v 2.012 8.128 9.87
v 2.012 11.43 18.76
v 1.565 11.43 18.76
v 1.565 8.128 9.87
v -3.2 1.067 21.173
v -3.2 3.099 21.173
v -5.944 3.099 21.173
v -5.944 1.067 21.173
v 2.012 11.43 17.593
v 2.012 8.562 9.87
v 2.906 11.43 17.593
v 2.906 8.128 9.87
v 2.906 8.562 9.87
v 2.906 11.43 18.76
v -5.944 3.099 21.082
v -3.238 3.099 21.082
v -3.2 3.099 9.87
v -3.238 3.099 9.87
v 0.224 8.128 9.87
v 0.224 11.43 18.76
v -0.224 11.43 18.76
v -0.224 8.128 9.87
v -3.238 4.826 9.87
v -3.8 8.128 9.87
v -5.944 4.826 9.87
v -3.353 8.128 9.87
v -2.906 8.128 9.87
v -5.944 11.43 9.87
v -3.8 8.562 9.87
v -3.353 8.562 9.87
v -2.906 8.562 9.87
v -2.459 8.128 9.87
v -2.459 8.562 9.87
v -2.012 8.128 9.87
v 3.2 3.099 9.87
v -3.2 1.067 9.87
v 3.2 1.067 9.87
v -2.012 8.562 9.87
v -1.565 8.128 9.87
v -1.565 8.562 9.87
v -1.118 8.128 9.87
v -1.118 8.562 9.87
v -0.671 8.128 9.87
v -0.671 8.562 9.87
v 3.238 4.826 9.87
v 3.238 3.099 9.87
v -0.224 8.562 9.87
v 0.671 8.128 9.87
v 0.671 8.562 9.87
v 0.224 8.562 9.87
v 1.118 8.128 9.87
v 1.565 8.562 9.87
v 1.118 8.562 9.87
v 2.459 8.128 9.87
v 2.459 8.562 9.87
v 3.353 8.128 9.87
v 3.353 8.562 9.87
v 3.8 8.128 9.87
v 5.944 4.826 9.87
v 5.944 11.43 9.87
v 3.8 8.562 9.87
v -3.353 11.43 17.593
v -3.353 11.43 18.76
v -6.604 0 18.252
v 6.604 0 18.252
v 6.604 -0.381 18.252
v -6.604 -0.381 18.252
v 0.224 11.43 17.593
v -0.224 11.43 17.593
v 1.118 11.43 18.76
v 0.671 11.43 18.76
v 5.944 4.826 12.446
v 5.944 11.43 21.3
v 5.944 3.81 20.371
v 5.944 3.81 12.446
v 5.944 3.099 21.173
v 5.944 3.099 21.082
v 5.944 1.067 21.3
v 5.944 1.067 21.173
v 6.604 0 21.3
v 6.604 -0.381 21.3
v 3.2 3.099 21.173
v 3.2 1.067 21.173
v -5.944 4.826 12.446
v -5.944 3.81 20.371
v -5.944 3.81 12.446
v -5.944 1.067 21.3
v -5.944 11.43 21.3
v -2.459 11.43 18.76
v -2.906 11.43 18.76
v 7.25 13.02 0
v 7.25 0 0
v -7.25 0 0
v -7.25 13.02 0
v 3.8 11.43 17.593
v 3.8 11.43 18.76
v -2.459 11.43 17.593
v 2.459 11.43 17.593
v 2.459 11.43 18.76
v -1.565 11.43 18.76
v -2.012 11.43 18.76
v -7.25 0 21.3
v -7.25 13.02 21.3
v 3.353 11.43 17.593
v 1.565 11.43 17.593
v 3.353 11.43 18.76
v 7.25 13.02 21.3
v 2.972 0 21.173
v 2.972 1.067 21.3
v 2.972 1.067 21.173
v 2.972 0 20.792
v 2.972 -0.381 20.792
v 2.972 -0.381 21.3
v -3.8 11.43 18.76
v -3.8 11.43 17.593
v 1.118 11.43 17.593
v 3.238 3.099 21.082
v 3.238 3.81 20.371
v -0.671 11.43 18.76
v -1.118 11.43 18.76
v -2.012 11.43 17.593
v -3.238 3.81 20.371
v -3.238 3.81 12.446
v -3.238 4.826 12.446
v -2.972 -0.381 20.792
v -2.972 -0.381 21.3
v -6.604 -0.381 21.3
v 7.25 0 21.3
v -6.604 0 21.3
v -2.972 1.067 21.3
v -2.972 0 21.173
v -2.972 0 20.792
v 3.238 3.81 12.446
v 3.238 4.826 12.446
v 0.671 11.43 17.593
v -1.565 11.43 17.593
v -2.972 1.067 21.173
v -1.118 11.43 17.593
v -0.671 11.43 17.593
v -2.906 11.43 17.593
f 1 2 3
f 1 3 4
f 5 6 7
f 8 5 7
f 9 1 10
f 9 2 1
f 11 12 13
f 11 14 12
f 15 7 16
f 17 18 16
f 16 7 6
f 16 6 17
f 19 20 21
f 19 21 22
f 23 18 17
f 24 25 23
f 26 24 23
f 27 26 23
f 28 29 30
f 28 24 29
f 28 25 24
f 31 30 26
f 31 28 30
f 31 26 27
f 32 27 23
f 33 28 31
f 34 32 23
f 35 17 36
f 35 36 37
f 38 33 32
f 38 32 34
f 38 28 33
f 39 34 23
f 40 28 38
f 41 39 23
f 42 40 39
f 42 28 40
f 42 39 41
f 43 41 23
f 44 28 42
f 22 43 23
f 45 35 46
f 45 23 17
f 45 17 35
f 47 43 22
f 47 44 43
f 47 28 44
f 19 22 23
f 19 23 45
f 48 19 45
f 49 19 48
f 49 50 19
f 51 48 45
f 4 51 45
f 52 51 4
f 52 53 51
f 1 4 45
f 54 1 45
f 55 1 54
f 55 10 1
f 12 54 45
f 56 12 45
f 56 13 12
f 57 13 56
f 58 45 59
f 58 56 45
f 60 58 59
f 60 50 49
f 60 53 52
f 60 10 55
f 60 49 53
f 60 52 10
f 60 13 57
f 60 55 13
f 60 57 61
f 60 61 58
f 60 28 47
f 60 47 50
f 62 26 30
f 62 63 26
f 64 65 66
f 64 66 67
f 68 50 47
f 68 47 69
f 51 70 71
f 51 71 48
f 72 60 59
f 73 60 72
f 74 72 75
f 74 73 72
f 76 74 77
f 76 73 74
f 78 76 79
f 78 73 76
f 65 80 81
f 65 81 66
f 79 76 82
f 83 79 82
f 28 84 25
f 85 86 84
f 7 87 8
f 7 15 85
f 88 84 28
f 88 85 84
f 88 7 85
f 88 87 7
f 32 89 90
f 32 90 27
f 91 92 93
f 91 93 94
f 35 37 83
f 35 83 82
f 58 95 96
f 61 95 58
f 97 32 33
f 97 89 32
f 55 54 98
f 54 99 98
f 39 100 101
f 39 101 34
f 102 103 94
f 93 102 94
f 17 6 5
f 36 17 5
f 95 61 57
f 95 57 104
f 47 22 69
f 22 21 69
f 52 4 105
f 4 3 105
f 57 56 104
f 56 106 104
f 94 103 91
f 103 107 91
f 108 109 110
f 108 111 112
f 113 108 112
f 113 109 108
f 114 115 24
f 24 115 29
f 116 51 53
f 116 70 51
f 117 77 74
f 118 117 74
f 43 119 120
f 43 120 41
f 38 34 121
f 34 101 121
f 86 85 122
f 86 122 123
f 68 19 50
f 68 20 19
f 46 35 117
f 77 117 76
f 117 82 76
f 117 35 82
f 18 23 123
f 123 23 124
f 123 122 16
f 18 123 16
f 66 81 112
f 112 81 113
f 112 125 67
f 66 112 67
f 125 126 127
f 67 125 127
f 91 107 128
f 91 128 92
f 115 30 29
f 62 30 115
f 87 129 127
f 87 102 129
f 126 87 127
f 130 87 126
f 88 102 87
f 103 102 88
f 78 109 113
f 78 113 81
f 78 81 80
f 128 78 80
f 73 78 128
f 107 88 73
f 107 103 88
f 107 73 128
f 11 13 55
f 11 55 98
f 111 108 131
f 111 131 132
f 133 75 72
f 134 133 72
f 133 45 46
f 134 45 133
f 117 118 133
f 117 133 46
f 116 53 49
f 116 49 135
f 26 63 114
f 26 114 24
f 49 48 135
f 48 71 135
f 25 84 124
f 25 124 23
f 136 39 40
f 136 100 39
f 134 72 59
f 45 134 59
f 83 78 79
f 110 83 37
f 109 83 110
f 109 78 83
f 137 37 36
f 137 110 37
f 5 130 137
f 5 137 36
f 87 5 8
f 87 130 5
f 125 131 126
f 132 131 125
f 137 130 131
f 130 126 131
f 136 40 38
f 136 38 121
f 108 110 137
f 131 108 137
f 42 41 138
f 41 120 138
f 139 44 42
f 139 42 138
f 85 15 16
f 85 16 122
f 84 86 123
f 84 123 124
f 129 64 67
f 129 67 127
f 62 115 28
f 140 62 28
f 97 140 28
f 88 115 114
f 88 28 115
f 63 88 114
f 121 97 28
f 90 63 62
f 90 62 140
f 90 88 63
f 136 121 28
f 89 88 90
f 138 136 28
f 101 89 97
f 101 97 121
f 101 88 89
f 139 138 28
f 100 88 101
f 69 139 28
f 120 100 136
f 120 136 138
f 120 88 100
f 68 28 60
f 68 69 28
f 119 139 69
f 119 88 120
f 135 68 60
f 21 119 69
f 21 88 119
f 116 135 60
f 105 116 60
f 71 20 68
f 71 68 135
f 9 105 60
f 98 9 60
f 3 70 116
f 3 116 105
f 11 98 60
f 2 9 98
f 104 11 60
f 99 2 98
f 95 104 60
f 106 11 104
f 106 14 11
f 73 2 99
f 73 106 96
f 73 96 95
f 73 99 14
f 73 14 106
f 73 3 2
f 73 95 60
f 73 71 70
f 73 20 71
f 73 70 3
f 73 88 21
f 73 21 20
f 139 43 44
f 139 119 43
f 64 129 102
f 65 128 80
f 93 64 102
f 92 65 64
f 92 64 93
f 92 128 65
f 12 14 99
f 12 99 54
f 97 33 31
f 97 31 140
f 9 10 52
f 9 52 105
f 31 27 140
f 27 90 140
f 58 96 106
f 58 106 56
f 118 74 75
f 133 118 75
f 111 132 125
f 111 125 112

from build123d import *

# Parameters (mm, degrees)
SKETCH1_W          = 21.3
SKETCH1_H          = 13.02
EXTRUDE1_DEPTH     = 7.25
CUT_EXTRUDE1_DEPTH = 0.127
CUT_EXTRUDE2_DEPTH = 11.303
EXTRUDE2_DEPTH     = 3.79984
CUT_EXTRUDE3_START = -11.43
SKETCH5_W          = 0.44704
SKETCH5_H          = 3.302
CUT_EXTRUDE3_DEPTH = 8.89
EXTRUDE3_DEPTH     = 2.7051
EXTRUDE4_DEPTH     = 0.381


with BuildPart() as part:
    # Sketch1 → Extrude1 (new, symmetric)
    with BuildSketch(Plane(origin=(0, 0, 0), x_dir=(0, 0, -1), z_dir=(1, 0, 0))):
        with Locations((-10.65, 6.51)):
            Rectangle(SKETCH1_W, SKETCH1_H)
    extrude(amount=EXTRUDE1_DEPTH, both=True)

    # Sketch2 → Cut-Extrude1 (cut)
    with BuildSketch(Plane.XY.offset(21.3)):
        Polygon((-5.9436, 11.43), (5.9436, 11.43), (5.9436, 1.0668), (2.9718, 1.0668), (2.9718, 0), (-2.9718, 0), (-2.9718, 1.0668), (-5.9436, 1.0668), align=None)
    extrude(amount=-CUT_EXTRUDE1_DEPTH, mode=Mode.SUBTRACT)

    # Sketch3 → Cut-Extrude2 (cut)
    with BuildSketch(Plane.XY.offset(21.173)):
        Polygon((-5.9436, 3.0988), (-3.2004, 3.0988), (-3.2004, 1.0668), (3.2004, 1.0668), (3.2004, 3.0988), (5.9436, 3.0988), (5.9436, 11.43), (-5.9436, 11.43), align=None)
    extrude(amount=-CUT_EXTRUDE2_DEPTH, mode=Mode.SUBTRACT)

    # Sketch4 → Extrude2 (add, symmetric)
    with BuildSketch(Plane(origin=(0, 0, 0), x_dir=(0, 0, -1), z_dir=(1, 0, 0))):
        Polygon((-17.592809528, 11.43), (-18.76, 11.43), (-9.87, 8.128), (-9.87, 8.56152789), align=None)
    extrude(amount=EXTRUDE2_DEPTH, both=True)

    # Sketch5 → Cut-Extrude3 (cut)
    with BuildSketch(Plane.XY.offset(21.3).offset(CUT_EXTRUDE3_START)):
        with Locations((-3.12928, 9.779)):
            Rectangle(SKETCH5_W, SKETCH5_H)
        with Locations((-2.2352, 9.779)):
            Rectangle(SKETCH5_W, SKETCH5_H)
        with Locations((-1.34112, 9.779)):
            Rectangle(SKETCH5_W, SKETCH5_H)
        with Locations((-0.44704, 9.779)):
            Rectangle(SKETCH5_W, SKETCH5_H)
        with Locations((0.44704, 9.779)):
            Rectangle(SKETCH5_W, SKETCH5_H)
        with Locations((1.34112, 9.779)):
            Rectangle(SKETCH5_W, SKETCH5_H)
        with Locations((2.2352, 9.779)):
            Rectangle(SKETCH5_W, SKETCH5_H)
        with Locations((3.12928, 9.779)):
            Rectangle(SKETCH5_W, SKETCH5_H)
    extrude(amount=CUT_EXTRUDE3_DEPTH, mode=Mode.SUBTRACT)

    # Sketch6 → Extrude3 (add)
    with BuildSketch(Plane(origin=(-5.9436, 0, 0), x_dir=(0, 0, -1), z_dir=(1, 0, 0))):
        Polygon((-9.87, 3.0988), (-21.082, 3.0988), (-20.3708, 3.81), (-12.446, 3.81), (-12.446, 4.826), (-9.87, 4.826), align=None)
    extrude3 = extrude(amount=EXTRUDE3_DEPTH)

    # Mirror1: Extrude3 across plane
    add(extrude3.mirror(Plane(origin=(0, 0, 0), x_dir=(0, 0, 1), z_dir=(1, 0, 0))))

    # Sketch14 → Extrude4 (add)
    with BuildSketch(Plane.XZ):
        Polygon((-6.604, 21.3), (-2.9718, 21.3), (-2.9718, 20.792), (2.9718, 20.792), (2.9718, 21.3), (6.604, 21.3), (6.604, 18.252), (-6.604, 18.252), align=None)
    extrude(amount=EXTRUDE4_DEPTH)


solid = part.part
